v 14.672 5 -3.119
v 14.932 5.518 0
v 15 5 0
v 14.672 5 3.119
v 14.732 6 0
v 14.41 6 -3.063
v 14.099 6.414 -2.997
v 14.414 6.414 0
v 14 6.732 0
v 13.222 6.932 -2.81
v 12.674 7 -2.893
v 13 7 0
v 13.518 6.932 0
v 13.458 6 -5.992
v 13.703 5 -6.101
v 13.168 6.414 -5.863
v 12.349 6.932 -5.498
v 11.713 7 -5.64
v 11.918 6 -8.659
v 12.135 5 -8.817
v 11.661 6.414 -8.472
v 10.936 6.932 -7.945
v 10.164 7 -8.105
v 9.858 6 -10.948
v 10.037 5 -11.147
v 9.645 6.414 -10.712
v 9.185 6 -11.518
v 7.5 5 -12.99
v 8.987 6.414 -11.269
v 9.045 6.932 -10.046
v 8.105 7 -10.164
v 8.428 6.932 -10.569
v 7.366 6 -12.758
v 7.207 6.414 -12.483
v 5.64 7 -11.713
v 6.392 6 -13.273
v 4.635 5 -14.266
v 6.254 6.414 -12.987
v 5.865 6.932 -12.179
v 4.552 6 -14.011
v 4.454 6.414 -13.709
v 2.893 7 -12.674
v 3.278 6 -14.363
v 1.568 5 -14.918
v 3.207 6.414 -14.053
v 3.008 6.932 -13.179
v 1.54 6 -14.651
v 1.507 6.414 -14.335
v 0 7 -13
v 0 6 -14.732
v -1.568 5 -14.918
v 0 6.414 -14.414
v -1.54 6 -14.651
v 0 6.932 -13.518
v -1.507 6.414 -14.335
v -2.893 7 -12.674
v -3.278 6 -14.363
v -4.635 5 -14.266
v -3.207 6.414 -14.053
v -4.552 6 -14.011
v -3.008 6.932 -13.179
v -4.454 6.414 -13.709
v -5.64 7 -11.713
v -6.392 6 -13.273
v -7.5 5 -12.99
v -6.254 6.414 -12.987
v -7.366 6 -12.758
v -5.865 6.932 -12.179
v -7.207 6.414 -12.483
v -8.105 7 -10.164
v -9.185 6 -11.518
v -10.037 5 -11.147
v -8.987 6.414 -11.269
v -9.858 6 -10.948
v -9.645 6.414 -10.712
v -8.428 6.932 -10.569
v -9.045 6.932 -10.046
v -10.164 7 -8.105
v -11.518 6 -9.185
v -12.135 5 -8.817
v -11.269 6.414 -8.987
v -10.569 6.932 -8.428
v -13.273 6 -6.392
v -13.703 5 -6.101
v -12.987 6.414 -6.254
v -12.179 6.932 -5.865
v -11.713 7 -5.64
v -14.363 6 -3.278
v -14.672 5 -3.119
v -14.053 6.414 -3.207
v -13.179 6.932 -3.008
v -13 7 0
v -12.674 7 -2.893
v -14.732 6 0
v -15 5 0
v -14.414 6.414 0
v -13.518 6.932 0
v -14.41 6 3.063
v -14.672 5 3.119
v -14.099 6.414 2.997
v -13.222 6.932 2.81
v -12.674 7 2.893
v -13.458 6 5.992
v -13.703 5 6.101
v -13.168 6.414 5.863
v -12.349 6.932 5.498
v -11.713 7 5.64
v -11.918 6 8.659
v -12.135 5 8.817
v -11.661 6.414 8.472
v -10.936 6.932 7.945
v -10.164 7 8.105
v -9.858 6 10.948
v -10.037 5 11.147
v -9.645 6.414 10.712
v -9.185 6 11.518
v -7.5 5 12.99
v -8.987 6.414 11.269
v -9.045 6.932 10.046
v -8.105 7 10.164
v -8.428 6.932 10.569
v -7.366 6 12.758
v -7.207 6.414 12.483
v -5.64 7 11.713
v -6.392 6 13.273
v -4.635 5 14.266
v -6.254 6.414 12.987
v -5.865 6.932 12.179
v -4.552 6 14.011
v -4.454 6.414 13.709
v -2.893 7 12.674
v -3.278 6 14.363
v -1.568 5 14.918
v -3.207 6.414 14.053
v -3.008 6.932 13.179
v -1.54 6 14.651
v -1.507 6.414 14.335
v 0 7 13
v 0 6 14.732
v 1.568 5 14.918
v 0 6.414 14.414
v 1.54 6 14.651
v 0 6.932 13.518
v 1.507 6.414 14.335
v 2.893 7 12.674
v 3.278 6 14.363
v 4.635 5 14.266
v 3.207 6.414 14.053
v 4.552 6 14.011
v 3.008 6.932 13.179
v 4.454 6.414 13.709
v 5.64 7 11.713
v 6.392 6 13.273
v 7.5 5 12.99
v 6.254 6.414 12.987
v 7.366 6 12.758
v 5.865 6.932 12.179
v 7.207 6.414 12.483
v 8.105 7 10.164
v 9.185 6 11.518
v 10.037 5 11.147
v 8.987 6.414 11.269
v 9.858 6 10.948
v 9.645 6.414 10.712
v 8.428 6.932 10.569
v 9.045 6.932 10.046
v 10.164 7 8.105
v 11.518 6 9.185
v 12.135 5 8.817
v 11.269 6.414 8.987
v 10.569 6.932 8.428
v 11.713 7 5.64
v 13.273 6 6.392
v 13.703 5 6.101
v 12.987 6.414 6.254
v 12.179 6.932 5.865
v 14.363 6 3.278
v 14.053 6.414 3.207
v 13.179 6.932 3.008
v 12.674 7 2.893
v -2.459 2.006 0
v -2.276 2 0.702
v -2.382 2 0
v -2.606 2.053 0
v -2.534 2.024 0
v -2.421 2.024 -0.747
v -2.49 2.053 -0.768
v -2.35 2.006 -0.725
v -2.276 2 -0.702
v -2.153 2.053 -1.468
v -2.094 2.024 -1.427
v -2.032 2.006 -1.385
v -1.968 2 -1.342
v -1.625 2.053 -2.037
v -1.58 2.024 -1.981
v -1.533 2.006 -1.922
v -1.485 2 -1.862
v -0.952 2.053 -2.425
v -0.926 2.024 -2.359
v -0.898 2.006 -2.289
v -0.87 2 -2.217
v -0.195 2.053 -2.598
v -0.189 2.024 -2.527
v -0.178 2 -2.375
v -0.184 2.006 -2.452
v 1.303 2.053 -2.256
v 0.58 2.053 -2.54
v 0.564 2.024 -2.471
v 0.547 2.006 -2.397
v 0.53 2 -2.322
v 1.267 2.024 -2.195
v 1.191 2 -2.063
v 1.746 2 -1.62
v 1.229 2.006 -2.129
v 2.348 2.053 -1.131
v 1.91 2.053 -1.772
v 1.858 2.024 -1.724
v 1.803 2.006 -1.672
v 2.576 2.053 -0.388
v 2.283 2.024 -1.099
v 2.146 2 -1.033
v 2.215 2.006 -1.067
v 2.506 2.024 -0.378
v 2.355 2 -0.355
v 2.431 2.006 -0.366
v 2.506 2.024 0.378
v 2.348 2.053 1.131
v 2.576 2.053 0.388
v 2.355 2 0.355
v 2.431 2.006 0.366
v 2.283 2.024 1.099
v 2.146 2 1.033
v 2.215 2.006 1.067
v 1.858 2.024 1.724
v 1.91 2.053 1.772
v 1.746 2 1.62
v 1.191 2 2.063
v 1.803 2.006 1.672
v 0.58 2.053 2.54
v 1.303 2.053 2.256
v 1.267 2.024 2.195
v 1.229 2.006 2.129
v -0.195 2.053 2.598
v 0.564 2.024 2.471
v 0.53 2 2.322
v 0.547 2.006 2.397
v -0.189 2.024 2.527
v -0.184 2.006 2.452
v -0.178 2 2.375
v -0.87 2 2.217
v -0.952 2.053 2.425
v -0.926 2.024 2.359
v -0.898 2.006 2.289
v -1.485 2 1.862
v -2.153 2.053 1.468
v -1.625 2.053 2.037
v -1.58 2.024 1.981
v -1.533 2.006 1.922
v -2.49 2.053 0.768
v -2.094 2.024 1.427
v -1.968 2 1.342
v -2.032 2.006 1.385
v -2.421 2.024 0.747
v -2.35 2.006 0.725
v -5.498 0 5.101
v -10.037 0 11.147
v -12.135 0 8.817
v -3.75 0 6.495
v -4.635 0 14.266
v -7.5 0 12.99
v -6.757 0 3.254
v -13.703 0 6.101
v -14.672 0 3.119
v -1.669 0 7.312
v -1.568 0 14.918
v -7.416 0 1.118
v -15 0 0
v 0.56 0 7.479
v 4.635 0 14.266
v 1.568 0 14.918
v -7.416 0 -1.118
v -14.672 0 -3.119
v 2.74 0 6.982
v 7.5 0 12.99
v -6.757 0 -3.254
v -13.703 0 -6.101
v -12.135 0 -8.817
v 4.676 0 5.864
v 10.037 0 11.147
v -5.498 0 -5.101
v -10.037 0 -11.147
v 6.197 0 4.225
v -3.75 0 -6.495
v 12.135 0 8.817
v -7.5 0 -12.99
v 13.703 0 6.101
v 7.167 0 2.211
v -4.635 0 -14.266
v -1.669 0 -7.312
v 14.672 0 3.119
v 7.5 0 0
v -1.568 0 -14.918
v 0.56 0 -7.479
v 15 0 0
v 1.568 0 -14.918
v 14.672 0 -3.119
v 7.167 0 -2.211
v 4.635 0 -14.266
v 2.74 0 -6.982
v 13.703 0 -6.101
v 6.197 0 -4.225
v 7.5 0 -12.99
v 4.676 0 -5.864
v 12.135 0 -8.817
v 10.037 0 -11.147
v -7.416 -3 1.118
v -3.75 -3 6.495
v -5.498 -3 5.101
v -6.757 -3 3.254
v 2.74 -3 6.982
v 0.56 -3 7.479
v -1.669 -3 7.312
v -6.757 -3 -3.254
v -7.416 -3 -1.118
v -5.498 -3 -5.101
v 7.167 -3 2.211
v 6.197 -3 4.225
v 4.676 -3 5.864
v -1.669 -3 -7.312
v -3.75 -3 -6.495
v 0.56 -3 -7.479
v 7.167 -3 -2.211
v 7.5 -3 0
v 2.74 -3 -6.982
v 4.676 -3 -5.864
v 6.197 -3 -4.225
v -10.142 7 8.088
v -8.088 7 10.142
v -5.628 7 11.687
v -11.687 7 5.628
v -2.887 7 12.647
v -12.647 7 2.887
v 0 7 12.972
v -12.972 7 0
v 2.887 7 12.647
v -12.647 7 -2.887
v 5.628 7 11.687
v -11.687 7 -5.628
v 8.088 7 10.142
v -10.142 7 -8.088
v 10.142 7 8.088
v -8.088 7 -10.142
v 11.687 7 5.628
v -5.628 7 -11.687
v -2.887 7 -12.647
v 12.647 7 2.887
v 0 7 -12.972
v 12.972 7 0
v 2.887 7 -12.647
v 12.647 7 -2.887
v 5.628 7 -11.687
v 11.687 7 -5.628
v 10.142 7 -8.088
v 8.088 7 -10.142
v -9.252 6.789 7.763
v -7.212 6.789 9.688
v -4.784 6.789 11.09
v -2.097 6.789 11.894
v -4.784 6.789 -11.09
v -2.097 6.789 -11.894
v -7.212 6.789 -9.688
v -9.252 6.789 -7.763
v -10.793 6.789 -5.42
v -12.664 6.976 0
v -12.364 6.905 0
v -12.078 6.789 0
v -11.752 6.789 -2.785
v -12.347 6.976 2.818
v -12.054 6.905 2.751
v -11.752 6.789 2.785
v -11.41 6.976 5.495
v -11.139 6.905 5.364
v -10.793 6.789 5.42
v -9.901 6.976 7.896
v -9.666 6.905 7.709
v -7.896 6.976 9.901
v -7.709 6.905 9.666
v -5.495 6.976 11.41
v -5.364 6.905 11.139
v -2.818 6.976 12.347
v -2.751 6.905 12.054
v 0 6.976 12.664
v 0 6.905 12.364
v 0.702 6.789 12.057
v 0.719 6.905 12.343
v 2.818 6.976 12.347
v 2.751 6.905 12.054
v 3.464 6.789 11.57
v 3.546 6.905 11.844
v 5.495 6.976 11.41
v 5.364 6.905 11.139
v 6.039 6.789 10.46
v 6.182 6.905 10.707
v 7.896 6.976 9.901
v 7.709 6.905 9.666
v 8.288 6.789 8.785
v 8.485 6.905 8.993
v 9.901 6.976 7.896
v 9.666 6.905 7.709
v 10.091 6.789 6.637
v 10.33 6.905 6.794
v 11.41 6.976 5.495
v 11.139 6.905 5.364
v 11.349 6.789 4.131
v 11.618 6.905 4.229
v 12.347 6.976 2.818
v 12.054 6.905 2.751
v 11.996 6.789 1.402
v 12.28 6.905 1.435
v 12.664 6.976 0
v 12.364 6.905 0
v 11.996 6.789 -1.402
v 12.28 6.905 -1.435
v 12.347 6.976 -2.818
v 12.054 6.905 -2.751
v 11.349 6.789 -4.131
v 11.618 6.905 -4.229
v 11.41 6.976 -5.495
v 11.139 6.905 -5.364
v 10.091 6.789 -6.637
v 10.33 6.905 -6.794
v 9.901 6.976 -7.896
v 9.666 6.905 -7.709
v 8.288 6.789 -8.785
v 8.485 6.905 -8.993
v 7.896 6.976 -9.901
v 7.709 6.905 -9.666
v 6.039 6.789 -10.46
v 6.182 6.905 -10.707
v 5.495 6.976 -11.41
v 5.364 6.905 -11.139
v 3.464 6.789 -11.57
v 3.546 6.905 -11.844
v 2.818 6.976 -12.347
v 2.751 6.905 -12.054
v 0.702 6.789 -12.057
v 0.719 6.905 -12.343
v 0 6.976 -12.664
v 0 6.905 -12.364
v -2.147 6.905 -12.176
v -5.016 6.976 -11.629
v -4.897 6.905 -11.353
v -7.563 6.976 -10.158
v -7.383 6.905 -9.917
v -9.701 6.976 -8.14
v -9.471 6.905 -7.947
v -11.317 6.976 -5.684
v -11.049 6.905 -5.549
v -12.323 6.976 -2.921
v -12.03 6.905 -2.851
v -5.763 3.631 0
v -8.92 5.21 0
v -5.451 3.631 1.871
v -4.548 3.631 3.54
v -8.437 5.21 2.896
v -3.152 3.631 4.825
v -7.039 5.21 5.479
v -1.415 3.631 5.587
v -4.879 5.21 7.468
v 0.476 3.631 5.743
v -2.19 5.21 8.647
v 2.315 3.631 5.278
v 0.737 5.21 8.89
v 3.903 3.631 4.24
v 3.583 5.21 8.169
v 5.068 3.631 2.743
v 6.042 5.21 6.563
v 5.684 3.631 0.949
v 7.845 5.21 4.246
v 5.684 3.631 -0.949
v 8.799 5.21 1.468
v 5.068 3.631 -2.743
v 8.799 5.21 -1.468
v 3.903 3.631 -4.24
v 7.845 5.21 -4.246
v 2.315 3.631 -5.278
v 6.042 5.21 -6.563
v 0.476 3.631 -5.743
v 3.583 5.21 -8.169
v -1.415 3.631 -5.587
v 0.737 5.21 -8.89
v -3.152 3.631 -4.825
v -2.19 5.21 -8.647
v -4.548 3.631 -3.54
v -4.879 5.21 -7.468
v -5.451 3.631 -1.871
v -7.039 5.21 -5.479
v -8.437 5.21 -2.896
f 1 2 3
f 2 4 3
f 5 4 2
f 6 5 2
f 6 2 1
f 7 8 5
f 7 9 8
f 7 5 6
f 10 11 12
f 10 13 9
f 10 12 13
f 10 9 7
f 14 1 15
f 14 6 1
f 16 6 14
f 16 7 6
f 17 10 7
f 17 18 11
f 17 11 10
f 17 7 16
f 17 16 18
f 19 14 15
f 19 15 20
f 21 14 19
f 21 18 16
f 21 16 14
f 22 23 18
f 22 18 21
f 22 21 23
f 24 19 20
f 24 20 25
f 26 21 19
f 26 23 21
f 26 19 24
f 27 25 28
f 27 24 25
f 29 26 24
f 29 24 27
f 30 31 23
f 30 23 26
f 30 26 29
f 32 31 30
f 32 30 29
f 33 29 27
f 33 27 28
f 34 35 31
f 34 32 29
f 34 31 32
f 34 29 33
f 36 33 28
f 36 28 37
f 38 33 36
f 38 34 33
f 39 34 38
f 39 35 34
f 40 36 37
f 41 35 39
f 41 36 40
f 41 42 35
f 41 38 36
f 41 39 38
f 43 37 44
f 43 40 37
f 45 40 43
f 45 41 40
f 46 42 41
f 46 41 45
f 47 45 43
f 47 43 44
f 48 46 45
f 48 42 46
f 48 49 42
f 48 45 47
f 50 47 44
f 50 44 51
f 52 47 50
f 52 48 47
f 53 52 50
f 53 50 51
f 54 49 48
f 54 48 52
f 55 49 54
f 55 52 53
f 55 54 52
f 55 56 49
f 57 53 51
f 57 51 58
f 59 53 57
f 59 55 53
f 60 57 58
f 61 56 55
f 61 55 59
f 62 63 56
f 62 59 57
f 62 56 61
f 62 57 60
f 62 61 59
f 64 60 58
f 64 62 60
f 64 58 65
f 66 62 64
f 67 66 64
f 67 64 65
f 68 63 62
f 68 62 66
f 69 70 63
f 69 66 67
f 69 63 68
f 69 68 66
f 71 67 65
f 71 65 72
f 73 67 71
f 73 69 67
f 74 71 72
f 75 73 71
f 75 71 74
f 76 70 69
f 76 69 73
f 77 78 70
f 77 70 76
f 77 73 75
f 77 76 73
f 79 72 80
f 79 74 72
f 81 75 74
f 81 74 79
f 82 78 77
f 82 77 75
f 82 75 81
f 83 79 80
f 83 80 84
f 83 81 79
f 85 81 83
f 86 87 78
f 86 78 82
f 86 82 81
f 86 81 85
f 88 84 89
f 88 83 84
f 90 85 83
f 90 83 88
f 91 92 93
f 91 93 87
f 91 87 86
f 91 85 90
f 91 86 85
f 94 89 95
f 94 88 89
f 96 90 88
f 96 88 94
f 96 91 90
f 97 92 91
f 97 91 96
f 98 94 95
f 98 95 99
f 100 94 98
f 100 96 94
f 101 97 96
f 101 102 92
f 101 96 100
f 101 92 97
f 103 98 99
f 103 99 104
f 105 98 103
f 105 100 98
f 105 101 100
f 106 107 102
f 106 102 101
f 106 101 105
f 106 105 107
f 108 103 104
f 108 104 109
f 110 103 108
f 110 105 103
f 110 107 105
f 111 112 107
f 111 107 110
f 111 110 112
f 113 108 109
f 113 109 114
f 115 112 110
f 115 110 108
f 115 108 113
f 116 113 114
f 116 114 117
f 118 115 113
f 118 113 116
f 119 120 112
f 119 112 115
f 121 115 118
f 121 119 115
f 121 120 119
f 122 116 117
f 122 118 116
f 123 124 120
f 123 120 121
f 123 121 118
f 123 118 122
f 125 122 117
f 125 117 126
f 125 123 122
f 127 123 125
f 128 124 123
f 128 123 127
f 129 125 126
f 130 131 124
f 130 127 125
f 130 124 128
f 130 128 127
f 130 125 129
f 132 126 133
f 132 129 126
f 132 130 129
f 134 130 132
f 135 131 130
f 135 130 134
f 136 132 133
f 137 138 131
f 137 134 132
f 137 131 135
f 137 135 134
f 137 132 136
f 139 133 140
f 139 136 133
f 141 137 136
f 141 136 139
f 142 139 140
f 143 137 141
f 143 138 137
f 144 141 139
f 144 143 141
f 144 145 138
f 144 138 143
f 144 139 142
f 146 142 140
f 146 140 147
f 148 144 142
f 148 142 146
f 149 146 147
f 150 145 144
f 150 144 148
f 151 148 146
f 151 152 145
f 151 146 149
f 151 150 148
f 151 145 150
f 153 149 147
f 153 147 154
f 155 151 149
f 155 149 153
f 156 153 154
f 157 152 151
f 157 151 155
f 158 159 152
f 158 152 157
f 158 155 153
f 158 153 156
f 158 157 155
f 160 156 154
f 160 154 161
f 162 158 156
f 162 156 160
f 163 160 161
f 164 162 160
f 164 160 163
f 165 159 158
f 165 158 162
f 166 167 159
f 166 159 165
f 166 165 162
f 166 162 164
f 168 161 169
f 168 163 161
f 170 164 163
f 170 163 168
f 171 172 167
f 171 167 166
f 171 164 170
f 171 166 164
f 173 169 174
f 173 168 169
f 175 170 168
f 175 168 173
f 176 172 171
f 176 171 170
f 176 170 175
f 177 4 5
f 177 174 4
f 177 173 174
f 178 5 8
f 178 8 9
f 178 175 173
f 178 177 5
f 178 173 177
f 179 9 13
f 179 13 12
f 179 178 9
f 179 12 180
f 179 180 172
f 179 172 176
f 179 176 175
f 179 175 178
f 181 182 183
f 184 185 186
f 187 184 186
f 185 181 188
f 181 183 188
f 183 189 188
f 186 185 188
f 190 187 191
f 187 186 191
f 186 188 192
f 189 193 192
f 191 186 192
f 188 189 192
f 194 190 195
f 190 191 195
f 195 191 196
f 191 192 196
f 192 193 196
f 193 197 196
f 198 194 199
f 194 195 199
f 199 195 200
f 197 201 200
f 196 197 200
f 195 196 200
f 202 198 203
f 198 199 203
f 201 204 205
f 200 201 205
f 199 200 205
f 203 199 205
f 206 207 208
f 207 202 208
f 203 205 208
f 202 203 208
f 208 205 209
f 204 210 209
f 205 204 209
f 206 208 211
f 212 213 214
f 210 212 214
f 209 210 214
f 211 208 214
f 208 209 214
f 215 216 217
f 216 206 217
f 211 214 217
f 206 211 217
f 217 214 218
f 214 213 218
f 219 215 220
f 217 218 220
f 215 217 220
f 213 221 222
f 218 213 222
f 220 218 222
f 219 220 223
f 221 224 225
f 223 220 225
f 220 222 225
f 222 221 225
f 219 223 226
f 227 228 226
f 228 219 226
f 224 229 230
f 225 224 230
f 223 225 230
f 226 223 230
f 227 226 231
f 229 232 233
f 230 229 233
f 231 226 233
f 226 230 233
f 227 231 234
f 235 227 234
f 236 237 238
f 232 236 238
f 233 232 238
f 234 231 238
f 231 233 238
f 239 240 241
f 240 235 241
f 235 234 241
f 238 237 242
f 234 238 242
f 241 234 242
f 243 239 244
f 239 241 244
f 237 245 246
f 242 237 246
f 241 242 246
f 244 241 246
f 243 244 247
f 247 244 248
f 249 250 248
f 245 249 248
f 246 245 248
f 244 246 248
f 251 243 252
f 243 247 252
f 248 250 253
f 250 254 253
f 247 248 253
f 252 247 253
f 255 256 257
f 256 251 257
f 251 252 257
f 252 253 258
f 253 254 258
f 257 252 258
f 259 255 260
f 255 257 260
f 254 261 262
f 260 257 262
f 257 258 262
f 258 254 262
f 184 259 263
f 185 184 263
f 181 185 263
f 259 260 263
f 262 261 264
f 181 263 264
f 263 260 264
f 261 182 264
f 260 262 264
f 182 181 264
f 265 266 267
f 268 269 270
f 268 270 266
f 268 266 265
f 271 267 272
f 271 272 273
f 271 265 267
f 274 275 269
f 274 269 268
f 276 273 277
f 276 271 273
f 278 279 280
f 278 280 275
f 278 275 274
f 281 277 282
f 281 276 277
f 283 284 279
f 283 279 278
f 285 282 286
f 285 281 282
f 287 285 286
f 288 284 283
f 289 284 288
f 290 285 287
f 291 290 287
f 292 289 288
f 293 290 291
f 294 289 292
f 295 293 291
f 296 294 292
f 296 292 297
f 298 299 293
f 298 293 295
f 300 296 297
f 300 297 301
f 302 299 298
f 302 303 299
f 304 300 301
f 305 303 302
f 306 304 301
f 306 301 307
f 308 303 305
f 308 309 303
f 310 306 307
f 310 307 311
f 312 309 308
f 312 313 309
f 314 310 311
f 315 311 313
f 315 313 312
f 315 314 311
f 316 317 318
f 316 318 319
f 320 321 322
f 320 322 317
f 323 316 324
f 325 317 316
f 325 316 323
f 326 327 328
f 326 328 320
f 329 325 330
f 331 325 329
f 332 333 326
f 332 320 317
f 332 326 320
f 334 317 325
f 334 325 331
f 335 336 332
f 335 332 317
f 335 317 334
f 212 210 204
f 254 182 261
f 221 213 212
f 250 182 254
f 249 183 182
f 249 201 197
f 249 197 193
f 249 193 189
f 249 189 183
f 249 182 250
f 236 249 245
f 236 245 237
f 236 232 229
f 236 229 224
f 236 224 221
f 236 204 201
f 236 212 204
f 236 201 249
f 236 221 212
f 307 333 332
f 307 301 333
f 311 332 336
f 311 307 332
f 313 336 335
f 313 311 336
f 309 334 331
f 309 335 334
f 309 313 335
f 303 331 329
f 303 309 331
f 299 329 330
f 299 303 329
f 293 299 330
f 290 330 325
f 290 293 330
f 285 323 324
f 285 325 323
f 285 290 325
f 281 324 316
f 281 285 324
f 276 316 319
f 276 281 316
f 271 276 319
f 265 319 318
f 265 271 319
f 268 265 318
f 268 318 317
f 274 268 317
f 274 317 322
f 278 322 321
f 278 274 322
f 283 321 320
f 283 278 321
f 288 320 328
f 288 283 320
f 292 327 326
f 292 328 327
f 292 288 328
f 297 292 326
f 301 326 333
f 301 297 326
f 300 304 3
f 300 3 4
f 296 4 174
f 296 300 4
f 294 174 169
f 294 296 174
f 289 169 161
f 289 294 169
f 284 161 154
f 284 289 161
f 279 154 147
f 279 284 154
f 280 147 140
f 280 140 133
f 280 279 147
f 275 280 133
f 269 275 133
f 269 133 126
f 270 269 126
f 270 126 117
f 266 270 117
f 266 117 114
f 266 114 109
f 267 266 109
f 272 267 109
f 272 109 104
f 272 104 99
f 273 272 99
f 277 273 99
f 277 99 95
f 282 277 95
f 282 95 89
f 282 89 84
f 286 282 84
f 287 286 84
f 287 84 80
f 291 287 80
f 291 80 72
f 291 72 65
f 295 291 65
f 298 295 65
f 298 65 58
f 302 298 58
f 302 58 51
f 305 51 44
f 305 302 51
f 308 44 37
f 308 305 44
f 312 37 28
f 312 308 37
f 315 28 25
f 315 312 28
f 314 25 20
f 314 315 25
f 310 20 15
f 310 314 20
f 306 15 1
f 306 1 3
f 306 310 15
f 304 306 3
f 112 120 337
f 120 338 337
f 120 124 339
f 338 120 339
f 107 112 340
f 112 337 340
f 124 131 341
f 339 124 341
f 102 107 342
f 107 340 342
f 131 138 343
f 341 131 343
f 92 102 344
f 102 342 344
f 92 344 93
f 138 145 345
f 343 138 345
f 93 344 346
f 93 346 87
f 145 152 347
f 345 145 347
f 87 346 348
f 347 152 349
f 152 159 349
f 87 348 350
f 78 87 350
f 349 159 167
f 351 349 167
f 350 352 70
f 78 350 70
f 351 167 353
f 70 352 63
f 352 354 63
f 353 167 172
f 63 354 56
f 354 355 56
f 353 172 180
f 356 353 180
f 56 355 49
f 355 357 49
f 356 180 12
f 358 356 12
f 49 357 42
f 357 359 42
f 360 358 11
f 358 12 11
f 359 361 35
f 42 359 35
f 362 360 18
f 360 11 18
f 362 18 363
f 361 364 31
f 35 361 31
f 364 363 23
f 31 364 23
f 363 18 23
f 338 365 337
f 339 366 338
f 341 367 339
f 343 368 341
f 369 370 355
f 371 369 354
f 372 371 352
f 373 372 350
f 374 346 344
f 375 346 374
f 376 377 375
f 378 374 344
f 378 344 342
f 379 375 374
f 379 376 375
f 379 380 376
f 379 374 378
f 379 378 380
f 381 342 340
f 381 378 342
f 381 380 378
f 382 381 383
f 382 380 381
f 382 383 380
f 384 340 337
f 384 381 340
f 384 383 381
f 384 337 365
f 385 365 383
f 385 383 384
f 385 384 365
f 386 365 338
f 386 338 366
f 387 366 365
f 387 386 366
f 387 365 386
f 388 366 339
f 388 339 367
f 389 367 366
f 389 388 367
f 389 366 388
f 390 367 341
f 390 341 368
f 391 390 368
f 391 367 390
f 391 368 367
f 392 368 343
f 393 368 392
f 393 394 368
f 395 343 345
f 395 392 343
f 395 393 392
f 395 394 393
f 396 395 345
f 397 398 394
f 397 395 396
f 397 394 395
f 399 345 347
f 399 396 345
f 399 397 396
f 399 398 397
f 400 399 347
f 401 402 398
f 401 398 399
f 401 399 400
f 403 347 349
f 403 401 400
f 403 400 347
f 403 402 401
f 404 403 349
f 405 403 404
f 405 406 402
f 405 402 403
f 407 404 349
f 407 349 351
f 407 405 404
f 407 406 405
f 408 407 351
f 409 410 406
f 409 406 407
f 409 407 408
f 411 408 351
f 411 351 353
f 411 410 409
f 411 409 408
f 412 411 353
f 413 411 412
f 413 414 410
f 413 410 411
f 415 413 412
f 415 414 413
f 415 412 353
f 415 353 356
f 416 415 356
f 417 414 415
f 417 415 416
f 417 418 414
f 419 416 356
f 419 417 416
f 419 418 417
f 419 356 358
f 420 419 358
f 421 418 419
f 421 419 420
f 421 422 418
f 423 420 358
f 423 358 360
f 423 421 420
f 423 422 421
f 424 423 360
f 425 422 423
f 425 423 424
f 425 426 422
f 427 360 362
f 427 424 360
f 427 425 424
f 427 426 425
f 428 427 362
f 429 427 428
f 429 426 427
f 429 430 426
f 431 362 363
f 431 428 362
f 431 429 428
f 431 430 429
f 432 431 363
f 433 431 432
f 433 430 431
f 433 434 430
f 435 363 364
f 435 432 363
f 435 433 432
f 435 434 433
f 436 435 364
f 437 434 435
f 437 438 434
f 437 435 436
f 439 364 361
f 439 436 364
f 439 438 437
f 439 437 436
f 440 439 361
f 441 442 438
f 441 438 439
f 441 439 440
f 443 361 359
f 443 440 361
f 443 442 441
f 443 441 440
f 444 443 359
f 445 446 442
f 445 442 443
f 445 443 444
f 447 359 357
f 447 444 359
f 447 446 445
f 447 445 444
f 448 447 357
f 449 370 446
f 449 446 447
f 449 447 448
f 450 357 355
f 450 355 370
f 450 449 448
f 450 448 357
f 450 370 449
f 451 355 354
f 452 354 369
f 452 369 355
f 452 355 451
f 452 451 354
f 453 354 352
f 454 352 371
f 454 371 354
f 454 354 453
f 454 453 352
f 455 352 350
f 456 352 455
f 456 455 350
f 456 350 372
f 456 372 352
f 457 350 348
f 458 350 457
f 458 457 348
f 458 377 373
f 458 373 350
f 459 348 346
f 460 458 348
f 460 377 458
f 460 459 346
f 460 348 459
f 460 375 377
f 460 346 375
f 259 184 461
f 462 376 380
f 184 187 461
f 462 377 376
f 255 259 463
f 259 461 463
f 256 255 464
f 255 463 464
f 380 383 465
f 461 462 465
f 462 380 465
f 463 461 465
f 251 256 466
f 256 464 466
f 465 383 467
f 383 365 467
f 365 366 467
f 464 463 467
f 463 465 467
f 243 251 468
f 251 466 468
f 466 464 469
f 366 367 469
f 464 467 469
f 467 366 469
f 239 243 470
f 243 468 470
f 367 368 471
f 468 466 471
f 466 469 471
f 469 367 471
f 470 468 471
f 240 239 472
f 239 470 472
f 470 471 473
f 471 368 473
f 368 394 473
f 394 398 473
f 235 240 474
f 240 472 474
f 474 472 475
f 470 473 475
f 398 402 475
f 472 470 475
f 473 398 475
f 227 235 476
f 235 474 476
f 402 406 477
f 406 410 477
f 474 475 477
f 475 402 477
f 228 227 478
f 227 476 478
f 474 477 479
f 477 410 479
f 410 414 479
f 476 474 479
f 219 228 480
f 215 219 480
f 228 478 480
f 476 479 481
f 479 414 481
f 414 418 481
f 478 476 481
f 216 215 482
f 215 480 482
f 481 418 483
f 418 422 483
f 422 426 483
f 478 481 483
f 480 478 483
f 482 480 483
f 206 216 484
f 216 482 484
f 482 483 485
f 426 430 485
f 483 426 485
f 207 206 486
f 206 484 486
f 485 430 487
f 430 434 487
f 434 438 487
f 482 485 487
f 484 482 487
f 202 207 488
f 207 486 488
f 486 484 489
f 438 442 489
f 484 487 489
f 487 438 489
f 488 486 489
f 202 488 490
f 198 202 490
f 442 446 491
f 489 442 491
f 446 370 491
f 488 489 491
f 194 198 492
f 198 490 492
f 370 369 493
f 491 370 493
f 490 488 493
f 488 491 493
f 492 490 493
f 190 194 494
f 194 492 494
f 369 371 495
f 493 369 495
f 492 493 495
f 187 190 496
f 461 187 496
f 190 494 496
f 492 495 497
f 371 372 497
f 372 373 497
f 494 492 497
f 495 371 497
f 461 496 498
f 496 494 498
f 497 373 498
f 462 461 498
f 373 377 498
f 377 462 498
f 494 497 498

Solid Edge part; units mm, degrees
sketch "Sketch1" plane through (0, 0, 0) normal (0, -1, 0) x (1, 0, 0)
  circle A0 centre (0, 0) radius 15
extrude "Protrusion1" add sketch "Sketch1" against normal blind 7
sketch "Sketch2" plane through (0, 7, 0) normal (0, 1, 0) x (-1, 0, 0)
  circle A0 centre (0, 0) radius 12.5
extrude "ExtrudedCutout_3" cut sketch "Sketch2" against normal blind 5
chamfer "Chamfer_9" distance 10 distance2 5 1 edges at (12.5, 2, 0) measured on face at (-8.0833, 2, -8.5833)
sketch "Sketch3" plane through (0, 0, 0) normal (0, -1, 0) x (1, 0, 0)
  circle A0 centre (0, 0) radius 7.5
extrude "ExtrudedProtrusion_3" add sketch "Sketch3" along normal blind 3
fillet "Round_2" radius 2 2 edges at (12.5, 7, 0) (-15, 7, 0)
fillet "Round_3" radius 0.5 1 edges at (0, 2, 2.5)
